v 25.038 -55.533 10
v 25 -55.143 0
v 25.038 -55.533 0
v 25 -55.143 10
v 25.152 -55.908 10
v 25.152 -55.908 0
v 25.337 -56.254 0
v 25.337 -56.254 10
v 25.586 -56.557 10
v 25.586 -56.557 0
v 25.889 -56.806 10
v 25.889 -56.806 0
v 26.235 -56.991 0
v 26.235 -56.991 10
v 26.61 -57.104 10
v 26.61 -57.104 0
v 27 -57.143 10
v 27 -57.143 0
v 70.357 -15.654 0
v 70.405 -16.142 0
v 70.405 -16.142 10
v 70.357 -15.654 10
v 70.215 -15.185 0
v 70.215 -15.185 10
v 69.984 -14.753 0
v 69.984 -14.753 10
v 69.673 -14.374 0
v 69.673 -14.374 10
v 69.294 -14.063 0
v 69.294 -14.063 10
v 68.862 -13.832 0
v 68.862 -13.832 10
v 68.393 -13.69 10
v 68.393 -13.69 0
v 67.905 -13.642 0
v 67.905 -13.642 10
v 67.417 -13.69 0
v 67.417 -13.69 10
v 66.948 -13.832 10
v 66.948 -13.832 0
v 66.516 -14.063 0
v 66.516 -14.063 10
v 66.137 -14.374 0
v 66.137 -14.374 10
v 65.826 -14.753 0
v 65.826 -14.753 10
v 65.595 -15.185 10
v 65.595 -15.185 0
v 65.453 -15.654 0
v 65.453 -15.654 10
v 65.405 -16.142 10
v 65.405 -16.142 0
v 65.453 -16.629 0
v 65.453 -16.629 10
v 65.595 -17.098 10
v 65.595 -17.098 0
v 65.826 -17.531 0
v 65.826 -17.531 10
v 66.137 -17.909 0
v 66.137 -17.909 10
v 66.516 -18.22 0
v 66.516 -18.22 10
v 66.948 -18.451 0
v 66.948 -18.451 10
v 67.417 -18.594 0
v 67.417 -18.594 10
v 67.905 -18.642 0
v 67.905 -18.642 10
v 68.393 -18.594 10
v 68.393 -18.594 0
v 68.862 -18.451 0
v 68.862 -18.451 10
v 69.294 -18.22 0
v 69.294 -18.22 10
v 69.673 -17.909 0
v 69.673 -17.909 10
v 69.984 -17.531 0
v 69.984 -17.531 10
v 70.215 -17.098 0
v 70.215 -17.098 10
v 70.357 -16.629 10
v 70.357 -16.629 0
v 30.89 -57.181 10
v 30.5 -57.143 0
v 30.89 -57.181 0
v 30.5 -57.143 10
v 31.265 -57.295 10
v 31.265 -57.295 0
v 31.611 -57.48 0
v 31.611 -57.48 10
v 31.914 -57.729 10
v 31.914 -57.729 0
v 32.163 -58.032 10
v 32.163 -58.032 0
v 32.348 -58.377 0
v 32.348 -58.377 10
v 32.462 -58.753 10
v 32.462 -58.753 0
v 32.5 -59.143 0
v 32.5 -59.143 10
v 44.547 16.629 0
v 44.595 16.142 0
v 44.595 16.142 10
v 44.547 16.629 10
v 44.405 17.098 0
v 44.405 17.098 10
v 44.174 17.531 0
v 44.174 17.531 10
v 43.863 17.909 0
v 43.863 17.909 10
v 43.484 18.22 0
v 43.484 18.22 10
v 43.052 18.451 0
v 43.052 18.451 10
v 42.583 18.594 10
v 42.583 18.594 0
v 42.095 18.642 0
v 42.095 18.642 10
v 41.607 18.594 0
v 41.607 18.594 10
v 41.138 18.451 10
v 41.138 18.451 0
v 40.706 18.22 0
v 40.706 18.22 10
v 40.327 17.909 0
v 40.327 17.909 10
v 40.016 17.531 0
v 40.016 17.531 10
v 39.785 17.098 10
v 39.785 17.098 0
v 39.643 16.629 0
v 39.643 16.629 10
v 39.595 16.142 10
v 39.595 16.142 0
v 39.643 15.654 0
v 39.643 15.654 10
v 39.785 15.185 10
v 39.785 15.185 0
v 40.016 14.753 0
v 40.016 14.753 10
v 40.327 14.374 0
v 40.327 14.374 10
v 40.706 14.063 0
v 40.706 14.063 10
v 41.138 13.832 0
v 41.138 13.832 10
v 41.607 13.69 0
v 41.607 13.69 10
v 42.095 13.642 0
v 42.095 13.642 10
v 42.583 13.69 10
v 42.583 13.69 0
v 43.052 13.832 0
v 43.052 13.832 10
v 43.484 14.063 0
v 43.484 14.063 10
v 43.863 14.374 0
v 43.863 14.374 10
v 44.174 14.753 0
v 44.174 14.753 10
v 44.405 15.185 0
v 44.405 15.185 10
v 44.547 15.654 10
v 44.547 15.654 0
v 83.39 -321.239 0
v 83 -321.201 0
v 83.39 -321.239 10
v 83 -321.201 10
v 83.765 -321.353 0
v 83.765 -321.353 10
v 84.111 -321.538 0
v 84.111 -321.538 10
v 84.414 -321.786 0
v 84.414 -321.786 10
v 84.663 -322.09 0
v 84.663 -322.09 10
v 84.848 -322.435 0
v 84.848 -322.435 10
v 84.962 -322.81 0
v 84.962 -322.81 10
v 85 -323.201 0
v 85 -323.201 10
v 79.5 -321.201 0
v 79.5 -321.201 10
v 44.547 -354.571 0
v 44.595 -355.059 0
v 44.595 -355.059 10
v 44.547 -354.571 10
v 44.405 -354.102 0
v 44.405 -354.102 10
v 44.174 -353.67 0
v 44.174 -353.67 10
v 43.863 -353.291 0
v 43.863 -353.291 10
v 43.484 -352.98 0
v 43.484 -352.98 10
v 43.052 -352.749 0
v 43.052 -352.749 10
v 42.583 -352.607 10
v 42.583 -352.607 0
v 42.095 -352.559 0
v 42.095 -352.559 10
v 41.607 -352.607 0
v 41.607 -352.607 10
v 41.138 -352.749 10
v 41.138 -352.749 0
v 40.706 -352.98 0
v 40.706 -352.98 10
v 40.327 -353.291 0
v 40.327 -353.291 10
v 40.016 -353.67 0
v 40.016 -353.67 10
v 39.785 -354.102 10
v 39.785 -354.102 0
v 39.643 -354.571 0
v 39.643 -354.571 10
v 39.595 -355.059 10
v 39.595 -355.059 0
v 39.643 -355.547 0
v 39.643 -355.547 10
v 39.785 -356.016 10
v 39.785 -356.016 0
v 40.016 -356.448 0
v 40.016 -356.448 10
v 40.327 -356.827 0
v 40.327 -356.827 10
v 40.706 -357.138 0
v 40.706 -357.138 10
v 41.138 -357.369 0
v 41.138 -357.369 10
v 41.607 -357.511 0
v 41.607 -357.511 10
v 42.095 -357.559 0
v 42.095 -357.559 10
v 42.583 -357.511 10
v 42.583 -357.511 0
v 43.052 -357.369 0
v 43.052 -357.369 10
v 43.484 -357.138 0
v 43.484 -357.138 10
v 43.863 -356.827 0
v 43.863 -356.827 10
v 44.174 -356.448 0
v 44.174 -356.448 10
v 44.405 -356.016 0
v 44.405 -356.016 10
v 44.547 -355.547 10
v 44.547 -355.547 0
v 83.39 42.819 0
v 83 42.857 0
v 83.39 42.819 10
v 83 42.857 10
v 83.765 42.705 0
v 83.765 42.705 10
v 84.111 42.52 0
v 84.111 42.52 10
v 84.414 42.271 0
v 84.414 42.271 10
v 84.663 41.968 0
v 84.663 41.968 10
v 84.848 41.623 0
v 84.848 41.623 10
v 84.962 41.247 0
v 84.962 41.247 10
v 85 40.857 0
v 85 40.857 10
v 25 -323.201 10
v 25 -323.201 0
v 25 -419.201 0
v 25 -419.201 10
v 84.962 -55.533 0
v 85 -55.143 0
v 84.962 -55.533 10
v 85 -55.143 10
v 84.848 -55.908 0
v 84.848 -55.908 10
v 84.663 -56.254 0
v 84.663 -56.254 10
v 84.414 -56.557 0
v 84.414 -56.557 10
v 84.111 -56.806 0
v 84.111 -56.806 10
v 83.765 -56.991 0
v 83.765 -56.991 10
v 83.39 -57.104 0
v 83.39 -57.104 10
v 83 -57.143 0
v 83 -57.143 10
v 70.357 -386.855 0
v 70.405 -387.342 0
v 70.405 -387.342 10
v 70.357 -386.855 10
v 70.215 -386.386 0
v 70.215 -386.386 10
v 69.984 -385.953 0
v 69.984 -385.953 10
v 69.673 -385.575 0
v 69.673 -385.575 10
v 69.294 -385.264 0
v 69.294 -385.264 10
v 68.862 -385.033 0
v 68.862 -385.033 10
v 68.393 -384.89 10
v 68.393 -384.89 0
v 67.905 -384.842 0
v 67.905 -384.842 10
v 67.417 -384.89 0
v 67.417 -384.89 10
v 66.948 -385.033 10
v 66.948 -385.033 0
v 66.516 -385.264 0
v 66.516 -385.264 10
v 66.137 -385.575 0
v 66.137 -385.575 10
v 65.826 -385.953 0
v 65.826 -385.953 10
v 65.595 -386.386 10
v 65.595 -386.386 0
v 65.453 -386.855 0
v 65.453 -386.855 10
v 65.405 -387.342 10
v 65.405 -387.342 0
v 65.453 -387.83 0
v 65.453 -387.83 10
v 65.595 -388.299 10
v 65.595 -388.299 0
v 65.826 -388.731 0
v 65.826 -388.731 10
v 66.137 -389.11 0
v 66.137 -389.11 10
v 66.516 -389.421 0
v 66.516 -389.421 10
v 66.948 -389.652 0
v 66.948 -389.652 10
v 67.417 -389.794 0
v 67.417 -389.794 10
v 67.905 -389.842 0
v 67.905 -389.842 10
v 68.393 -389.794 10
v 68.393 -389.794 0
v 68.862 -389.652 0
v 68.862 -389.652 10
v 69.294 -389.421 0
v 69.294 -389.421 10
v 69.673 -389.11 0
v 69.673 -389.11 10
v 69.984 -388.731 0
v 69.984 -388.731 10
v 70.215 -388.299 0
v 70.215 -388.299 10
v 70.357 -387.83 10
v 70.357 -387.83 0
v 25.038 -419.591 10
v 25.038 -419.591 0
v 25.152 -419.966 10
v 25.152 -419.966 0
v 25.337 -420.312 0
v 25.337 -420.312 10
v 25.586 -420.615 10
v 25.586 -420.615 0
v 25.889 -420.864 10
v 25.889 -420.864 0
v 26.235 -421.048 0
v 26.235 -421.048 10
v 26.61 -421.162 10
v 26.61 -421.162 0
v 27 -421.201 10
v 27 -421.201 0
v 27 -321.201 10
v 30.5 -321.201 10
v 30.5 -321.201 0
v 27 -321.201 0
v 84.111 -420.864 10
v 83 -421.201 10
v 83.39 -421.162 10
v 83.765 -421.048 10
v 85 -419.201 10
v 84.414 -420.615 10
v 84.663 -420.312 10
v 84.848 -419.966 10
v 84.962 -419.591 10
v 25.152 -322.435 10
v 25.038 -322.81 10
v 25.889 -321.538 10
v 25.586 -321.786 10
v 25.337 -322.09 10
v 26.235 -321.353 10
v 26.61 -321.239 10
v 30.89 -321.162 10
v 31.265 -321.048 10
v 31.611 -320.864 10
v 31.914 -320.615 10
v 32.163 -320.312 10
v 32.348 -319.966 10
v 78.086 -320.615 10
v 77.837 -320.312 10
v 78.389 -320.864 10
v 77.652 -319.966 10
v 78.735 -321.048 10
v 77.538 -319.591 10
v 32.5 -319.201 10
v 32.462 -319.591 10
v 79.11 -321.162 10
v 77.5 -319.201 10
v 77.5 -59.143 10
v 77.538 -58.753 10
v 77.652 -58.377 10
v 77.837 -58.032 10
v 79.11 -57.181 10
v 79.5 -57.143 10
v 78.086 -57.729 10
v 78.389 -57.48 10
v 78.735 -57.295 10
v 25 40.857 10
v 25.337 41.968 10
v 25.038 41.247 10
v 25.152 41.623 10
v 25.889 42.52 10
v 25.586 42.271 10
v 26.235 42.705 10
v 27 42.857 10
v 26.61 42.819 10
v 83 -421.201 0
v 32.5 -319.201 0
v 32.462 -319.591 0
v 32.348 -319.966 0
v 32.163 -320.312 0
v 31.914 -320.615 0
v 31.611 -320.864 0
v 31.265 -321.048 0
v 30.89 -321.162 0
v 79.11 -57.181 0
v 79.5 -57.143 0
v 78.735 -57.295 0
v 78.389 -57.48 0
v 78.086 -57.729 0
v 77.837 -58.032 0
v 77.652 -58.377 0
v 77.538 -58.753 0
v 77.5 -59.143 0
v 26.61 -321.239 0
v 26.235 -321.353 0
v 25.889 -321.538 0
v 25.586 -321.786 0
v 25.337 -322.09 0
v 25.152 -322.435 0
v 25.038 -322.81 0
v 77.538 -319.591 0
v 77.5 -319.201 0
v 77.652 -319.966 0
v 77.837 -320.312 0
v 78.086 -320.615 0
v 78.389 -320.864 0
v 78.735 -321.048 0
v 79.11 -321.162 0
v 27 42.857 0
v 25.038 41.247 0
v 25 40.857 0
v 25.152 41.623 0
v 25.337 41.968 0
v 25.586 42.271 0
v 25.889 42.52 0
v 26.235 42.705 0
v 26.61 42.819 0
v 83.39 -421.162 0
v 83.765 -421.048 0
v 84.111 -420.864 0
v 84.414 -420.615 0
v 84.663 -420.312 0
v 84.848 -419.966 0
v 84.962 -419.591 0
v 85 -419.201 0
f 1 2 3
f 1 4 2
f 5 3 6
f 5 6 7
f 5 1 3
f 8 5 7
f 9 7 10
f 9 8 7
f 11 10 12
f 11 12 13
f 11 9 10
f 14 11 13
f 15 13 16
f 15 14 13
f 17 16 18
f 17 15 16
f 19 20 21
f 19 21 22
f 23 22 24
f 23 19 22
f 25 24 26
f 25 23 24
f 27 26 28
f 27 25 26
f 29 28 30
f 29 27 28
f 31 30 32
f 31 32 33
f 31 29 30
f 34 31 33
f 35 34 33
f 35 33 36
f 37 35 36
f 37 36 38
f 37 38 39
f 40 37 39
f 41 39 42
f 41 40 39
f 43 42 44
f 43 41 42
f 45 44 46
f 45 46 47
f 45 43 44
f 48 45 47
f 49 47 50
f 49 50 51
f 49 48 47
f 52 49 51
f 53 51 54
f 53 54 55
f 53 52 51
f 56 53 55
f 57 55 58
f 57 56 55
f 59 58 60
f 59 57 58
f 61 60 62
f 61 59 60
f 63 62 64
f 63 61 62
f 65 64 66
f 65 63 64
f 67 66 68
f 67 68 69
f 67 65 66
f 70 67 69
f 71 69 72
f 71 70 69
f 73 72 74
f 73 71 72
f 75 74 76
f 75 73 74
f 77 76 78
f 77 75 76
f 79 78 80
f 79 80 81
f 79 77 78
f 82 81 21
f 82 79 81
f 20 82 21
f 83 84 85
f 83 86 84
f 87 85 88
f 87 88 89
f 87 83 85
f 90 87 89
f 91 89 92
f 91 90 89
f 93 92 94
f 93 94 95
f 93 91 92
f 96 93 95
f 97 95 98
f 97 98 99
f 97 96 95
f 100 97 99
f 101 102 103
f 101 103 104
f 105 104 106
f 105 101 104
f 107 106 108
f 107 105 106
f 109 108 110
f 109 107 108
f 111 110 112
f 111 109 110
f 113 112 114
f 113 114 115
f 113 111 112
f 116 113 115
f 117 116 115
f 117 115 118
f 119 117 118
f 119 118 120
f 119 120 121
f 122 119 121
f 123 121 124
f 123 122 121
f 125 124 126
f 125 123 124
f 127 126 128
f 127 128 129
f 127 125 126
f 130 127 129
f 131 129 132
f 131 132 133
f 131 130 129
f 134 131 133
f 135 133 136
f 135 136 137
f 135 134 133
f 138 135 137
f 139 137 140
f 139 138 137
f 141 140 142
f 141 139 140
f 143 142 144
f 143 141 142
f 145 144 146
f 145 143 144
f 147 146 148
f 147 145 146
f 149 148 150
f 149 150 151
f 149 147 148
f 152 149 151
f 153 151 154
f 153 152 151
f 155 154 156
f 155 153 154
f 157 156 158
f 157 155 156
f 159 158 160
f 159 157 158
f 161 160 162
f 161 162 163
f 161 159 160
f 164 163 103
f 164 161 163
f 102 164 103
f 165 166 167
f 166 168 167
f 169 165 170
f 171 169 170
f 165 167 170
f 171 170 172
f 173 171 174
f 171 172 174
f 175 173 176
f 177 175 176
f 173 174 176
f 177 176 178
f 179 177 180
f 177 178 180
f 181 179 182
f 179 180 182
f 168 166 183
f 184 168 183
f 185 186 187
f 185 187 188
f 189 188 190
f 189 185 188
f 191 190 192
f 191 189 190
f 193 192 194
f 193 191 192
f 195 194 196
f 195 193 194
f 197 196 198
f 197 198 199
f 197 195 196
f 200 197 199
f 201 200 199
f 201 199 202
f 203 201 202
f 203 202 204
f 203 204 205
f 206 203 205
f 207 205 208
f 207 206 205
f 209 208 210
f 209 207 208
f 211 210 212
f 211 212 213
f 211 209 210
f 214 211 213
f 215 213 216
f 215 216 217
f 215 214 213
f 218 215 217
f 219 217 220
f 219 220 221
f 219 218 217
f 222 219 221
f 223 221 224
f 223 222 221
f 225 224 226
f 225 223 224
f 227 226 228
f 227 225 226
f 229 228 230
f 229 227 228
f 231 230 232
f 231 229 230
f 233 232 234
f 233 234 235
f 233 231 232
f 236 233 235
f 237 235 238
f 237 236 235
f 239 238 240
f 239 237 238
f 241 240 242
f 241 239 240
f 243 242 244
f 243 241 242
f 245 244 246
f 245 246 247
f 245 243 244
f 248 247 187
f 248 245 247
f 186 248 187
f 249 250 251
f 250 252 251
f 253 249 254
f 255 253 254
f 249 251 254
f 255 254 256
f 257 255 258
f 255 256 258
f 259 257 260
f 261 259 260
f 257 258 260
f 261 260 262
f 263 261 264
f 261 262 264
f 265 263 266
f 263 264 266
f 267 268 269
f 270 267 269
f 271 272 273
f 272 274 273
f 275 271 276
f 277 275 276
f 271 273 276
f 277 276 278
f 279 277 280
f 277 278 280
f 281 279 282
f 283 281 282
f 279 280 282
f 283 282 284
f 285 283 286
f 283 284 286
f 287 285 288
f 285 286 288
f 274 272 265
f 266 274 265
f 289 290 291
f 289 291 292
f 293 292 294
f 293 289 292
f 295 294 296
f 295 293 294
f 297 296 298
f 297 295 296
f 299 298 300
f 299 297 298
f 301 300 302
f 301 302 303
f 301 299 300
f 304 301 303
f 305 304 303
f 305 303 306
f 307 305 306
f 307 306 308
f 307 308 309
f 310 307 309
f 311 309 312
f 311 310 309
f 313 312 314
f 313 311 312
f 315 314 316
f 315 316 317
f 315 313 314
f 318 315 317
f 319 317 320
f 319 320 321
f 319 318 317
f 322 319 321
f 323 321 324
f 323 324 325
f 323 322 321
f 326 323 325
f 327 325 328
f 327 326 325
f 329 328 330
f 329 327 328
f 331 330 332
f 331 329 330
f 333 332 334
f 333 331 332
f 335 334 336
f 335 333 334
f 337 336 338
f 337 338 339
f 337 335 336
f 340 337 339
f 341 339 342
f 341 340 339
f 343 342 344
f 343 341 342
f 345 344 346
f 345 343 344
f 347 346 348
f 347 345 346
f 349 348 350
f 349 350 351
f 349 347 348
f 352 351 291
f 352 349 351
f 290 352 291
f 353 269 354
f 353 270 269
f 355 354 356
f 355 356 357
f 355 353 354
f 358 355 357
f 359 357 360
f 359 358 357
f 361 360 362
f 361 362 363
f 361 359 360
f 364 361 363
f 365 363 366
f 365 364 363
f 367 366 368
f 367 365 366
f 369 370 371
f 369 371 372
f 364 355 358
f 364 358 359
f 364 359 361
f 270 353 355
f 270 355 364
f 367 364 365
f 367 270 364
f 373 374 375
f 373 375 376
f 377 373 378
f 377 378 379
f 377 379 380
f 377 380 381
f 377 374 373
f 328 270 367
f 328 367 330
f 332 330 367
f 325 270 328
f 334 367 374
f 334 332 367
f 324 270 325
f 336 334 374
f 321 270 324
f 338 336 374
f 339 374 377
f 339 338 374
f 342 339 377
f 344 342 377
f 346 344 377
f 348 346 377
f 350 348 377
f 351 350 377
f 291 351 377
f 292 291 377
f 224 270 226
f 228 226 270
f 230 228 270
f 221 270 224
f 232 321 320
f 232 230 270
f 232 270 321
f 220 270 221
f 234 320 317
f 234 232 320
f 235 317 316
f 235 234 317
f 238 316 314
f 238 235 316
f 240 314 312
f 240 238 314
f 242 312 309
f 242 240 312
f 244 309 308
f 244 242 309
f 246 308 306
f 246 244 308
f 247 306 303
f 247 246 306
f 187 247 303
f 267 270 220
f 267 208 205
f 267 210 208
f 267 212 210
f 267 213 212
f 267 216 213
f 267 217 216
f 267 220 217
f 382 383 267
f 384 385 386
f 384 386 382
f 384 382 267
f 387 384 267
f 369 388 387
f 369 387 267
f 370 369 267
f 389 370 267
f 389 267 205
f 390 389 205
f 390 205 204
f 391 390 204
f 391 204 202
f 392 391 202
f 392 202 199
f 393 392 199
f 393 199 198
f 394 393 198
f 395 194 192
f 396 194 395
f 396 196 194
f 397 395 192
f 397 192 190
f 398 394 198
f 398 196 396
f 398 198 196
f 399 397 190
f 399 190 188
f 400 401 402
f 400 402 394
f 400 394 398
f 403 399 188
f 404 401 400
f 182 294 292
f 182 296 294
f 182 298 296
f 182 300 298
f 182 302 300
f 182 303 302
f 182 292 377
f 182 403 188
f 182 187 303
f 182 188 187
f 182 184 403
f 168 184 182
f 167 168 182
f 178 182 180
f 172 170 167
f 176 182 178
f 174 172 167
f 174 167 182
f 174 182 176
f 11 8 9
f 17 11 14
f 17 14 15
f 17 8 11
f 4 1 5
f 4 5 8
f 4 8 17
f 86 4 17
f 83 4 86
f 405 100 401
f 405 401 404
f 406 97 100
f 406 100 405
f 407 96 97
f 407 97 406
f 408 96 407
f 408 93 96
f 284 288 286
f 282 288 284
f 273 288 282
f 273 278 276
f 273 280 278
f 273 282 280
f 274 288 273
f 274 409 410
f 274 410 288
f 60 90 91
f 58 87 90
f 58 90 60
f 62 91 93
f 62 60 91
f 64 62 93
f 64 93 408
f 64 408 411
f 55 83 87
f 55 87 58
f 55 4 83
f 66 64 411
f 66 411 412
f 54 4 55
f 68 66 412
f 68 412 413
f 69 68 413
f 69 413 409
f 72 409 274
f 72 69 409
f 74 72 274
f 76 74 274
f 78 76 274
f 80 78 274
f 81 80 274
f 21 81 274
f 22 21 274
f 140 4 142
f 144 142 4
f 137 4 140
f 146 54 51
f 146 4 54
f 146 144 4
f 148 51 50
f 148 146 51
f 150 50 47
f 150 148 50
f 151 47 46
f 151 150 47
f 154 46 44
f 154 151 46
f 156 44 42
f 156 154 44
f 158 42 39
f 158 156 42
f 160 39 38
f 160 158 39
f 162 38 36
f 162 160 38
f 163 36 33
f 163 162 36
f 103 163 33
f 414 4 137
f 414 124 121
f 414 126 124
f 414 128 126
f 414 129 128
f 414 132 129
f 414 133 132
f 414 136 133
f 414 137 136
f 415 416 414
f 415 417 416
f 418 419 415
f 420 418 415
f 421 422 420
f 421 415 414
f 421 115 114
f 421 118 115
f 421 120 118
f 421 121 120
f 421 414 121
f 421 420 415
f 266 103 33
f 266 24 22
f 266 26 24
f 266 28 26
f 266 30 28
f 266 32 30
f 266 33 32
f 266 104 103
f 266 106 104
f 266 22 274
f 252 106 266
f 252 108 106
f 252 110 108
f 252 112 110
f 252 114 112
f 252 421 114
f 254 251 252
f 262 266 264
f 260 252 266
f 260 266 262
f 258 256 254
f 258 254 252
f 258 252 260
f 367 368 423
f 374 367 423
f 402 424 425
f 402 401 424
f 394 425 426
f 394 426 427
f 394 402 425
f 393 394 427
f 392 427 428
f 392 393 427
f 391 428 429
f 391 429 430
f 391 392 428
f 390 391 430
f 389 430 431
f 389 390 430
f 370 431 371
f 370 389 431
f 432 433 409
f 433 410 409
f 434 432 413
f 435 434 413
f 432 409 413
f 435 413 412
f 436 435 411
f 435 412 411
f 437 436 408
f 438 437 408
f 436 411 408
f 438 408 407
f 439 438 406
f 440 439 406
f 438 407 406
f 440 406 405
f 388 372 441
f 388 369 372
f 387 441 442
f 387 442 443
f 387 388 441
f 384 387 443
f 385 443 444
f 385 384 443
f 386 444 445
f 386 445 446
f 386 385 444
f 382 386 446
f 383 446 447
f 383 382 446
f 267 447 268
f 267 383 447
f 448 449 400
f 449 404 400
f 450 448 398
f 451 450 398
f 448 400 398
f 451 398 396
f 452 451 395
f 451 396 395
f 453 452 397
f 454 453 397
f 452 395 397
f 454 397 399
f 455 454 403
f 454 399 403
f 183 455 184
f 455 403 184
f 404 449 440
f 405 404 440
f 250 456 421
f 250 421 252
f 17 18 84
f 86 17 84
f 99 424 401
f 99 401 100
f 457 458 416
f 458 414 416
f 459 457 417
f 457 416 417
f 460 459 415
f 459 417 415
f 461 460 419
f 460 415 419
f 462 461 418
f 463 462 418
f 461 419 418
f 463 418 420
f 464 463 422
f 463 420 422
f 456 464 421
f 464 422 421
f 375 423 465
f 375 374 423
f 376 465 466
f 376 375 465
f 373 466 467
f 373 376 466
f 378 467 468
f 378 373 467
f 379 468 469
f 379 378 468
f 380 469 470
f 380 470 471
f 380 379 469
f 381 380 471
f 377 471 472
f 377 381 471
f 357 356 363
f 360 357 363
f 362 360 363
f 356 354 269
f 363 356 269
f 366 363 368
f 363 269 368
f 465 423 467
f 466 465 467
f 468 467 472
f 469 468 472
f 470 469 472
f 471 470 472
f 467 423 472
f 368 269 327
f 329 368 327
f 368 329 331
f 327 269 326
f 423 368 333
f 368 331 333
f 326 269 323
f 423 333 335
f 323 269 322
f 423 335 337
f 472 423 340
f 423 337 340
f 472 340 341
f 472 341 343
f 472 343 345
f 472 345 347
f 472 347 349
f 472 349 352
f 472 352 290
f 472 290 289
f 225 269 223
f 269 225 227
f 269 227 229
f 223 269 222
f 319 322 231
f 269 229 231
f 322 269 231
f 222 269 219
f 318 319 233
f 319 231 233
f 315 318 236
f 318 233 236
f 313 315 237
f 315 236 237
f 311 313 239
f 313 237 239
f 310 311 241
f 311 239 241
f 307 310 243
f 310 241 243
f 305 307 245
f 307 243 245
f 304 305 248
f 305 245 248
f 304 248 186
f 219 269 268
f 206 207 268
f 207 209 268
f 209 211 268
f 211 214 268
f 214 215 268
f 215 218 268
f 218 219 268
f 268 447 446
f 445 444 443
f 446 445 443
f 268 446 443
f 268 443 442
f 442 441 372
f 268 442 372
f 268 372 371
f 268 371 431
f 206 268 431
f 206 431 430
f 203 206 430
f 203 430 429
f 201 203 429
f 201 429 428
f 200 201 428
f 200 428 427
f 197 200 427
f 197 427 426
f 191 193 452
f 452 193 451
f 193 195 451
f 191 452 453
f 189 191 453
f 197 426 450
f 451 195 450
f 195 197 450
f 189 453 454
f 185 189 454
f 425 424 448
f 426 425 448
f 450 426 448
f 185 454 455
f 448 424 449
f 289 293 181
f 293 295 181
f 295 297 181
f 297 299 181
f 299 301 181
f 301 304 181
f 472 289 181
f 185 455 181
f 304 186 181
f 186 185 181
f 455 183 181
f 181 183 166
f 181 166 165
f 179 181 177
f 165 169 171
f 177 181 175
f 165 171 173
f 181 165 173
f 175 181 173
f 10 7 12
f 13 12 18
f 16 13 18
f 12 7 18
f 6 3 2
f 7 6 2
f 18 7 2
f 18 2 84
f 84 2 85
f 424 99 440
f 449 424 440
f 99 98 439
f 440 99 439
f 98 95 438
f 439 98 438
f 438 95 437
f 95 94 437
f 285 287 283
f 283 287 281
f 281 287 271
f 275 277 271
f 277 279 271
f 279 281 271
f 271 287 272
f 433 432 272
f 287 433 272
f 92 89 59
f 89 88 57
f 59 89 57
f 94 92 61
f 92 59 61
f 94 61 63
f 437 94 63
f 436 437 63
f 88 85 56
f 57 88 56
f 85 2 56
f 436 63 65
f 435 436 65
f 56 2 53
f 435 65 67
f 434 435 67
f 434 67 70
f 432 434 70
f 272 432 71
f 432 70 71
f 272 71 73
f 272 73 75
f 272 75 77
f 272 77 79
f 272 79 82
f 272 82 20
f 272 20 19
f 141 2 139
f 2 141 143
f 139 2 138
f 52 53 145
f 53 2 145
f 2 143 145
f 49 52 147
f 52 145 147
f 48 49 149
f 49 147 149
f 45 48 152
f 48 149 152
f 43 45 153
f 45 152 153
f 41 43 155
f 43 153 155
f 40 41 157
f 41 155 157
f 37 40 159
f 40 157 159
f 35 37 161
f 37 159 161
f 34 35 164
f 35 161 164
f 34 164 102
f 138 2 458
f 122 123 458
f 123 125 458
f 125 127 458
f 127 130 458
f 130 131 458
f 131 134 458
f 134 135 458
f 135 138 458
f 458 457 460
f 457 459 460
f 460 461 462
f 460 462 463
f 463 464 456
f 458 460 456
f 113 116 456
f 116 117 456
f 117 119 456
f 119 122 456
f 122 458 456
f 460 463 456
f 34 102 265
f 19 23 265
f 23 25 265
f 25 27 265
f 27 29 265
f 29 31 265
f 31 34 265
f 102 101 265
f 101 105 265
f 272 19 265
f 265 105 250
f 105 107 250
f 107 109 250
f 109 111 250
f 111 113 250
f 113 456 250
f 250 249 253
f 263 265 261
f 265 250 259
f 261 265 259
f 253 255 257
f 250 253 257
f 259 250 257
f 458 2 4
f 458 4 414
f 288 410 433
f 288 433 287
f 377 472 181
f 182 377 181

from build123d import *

# Parameters (mm, degrees)
SKETCH1_R           = 2.5
SKETCH1_W           = 45
SKETCH1_H           = 264.057811959
SKETCH1_W_2         = 60
SKETCH1_H_2         = 100
BOSS_EXTRUDE1_DEPTH = 10
FILLET1_R           = 2


with BuildPart() as part:
    # Sketch1 → Boss-Extrude1 (new body)
    # profile 1 of 3: a face of its own
    with BuildSketch(Plane.XY):
        Polygon((77.5, -321.200669102), (32.5, -321.200669102), (25, -321.200669102), (25, -421.200669102), (85, -421.200669102), (85, -321.200669102), align=None)
        with Locations((42.094920328, -355.059007065)):
            Circle(SKETCH1_R, mode=Mode.SUBTRACT)
        with Locations((67.905079672, -387.342331139)):
            Circle(SKETCH1_R, mode=Mode.SUBTRACT)
    # profile 2 of 3: a face of its own
    with BuildSketch(Plane.XY):
        with Locations((55, -189.171763123)):
            Rectangle(SKETCH1_W, SKETCH1_H)
    # profile 3 of 3: a face of its own
    with BuildSketch(Plane.XY):
        with Locations((55, -7.142857143)):
            Rectangle(SKETCH1_W_2, SKETCH1_H_2)
        with Locations((42.094920328, 16.141662037)):
            Circle(SKETCH1_R, mode=Mode.SUBTRACT)
        with Locations((67.905079672, -16.141662037)):
            Circle(SKETCH1_R, mode=Mode.SUBTRACT)
    extrude(amount=BOSS_EXTRUDE1_DEPTH)

    # Fillet1
    fillet1_edges = [part.edges().sort_by_distance(p)[0] for p in [
        (25, -421.200669102, 5),
        (25, -321.200669102, 5),
        (32.5, -321.200669102, 5),
        (32.5, -57.142857143, 5),
        (25, -57.142857143, 5),
        (25, 42.857142857, 5),
        (85, 42.857142857, 5),
        (85, -57.142857143, 5),
        (77.5, -57.142857143, 5),
        (77.5, -321.200669102, 5),
        (85, -321.200669102, 5),
        (85, -421.200669102, 5),
    ]]
    fillet(fillet1_edges, radius=FILLET1_R)


solid = part.part
